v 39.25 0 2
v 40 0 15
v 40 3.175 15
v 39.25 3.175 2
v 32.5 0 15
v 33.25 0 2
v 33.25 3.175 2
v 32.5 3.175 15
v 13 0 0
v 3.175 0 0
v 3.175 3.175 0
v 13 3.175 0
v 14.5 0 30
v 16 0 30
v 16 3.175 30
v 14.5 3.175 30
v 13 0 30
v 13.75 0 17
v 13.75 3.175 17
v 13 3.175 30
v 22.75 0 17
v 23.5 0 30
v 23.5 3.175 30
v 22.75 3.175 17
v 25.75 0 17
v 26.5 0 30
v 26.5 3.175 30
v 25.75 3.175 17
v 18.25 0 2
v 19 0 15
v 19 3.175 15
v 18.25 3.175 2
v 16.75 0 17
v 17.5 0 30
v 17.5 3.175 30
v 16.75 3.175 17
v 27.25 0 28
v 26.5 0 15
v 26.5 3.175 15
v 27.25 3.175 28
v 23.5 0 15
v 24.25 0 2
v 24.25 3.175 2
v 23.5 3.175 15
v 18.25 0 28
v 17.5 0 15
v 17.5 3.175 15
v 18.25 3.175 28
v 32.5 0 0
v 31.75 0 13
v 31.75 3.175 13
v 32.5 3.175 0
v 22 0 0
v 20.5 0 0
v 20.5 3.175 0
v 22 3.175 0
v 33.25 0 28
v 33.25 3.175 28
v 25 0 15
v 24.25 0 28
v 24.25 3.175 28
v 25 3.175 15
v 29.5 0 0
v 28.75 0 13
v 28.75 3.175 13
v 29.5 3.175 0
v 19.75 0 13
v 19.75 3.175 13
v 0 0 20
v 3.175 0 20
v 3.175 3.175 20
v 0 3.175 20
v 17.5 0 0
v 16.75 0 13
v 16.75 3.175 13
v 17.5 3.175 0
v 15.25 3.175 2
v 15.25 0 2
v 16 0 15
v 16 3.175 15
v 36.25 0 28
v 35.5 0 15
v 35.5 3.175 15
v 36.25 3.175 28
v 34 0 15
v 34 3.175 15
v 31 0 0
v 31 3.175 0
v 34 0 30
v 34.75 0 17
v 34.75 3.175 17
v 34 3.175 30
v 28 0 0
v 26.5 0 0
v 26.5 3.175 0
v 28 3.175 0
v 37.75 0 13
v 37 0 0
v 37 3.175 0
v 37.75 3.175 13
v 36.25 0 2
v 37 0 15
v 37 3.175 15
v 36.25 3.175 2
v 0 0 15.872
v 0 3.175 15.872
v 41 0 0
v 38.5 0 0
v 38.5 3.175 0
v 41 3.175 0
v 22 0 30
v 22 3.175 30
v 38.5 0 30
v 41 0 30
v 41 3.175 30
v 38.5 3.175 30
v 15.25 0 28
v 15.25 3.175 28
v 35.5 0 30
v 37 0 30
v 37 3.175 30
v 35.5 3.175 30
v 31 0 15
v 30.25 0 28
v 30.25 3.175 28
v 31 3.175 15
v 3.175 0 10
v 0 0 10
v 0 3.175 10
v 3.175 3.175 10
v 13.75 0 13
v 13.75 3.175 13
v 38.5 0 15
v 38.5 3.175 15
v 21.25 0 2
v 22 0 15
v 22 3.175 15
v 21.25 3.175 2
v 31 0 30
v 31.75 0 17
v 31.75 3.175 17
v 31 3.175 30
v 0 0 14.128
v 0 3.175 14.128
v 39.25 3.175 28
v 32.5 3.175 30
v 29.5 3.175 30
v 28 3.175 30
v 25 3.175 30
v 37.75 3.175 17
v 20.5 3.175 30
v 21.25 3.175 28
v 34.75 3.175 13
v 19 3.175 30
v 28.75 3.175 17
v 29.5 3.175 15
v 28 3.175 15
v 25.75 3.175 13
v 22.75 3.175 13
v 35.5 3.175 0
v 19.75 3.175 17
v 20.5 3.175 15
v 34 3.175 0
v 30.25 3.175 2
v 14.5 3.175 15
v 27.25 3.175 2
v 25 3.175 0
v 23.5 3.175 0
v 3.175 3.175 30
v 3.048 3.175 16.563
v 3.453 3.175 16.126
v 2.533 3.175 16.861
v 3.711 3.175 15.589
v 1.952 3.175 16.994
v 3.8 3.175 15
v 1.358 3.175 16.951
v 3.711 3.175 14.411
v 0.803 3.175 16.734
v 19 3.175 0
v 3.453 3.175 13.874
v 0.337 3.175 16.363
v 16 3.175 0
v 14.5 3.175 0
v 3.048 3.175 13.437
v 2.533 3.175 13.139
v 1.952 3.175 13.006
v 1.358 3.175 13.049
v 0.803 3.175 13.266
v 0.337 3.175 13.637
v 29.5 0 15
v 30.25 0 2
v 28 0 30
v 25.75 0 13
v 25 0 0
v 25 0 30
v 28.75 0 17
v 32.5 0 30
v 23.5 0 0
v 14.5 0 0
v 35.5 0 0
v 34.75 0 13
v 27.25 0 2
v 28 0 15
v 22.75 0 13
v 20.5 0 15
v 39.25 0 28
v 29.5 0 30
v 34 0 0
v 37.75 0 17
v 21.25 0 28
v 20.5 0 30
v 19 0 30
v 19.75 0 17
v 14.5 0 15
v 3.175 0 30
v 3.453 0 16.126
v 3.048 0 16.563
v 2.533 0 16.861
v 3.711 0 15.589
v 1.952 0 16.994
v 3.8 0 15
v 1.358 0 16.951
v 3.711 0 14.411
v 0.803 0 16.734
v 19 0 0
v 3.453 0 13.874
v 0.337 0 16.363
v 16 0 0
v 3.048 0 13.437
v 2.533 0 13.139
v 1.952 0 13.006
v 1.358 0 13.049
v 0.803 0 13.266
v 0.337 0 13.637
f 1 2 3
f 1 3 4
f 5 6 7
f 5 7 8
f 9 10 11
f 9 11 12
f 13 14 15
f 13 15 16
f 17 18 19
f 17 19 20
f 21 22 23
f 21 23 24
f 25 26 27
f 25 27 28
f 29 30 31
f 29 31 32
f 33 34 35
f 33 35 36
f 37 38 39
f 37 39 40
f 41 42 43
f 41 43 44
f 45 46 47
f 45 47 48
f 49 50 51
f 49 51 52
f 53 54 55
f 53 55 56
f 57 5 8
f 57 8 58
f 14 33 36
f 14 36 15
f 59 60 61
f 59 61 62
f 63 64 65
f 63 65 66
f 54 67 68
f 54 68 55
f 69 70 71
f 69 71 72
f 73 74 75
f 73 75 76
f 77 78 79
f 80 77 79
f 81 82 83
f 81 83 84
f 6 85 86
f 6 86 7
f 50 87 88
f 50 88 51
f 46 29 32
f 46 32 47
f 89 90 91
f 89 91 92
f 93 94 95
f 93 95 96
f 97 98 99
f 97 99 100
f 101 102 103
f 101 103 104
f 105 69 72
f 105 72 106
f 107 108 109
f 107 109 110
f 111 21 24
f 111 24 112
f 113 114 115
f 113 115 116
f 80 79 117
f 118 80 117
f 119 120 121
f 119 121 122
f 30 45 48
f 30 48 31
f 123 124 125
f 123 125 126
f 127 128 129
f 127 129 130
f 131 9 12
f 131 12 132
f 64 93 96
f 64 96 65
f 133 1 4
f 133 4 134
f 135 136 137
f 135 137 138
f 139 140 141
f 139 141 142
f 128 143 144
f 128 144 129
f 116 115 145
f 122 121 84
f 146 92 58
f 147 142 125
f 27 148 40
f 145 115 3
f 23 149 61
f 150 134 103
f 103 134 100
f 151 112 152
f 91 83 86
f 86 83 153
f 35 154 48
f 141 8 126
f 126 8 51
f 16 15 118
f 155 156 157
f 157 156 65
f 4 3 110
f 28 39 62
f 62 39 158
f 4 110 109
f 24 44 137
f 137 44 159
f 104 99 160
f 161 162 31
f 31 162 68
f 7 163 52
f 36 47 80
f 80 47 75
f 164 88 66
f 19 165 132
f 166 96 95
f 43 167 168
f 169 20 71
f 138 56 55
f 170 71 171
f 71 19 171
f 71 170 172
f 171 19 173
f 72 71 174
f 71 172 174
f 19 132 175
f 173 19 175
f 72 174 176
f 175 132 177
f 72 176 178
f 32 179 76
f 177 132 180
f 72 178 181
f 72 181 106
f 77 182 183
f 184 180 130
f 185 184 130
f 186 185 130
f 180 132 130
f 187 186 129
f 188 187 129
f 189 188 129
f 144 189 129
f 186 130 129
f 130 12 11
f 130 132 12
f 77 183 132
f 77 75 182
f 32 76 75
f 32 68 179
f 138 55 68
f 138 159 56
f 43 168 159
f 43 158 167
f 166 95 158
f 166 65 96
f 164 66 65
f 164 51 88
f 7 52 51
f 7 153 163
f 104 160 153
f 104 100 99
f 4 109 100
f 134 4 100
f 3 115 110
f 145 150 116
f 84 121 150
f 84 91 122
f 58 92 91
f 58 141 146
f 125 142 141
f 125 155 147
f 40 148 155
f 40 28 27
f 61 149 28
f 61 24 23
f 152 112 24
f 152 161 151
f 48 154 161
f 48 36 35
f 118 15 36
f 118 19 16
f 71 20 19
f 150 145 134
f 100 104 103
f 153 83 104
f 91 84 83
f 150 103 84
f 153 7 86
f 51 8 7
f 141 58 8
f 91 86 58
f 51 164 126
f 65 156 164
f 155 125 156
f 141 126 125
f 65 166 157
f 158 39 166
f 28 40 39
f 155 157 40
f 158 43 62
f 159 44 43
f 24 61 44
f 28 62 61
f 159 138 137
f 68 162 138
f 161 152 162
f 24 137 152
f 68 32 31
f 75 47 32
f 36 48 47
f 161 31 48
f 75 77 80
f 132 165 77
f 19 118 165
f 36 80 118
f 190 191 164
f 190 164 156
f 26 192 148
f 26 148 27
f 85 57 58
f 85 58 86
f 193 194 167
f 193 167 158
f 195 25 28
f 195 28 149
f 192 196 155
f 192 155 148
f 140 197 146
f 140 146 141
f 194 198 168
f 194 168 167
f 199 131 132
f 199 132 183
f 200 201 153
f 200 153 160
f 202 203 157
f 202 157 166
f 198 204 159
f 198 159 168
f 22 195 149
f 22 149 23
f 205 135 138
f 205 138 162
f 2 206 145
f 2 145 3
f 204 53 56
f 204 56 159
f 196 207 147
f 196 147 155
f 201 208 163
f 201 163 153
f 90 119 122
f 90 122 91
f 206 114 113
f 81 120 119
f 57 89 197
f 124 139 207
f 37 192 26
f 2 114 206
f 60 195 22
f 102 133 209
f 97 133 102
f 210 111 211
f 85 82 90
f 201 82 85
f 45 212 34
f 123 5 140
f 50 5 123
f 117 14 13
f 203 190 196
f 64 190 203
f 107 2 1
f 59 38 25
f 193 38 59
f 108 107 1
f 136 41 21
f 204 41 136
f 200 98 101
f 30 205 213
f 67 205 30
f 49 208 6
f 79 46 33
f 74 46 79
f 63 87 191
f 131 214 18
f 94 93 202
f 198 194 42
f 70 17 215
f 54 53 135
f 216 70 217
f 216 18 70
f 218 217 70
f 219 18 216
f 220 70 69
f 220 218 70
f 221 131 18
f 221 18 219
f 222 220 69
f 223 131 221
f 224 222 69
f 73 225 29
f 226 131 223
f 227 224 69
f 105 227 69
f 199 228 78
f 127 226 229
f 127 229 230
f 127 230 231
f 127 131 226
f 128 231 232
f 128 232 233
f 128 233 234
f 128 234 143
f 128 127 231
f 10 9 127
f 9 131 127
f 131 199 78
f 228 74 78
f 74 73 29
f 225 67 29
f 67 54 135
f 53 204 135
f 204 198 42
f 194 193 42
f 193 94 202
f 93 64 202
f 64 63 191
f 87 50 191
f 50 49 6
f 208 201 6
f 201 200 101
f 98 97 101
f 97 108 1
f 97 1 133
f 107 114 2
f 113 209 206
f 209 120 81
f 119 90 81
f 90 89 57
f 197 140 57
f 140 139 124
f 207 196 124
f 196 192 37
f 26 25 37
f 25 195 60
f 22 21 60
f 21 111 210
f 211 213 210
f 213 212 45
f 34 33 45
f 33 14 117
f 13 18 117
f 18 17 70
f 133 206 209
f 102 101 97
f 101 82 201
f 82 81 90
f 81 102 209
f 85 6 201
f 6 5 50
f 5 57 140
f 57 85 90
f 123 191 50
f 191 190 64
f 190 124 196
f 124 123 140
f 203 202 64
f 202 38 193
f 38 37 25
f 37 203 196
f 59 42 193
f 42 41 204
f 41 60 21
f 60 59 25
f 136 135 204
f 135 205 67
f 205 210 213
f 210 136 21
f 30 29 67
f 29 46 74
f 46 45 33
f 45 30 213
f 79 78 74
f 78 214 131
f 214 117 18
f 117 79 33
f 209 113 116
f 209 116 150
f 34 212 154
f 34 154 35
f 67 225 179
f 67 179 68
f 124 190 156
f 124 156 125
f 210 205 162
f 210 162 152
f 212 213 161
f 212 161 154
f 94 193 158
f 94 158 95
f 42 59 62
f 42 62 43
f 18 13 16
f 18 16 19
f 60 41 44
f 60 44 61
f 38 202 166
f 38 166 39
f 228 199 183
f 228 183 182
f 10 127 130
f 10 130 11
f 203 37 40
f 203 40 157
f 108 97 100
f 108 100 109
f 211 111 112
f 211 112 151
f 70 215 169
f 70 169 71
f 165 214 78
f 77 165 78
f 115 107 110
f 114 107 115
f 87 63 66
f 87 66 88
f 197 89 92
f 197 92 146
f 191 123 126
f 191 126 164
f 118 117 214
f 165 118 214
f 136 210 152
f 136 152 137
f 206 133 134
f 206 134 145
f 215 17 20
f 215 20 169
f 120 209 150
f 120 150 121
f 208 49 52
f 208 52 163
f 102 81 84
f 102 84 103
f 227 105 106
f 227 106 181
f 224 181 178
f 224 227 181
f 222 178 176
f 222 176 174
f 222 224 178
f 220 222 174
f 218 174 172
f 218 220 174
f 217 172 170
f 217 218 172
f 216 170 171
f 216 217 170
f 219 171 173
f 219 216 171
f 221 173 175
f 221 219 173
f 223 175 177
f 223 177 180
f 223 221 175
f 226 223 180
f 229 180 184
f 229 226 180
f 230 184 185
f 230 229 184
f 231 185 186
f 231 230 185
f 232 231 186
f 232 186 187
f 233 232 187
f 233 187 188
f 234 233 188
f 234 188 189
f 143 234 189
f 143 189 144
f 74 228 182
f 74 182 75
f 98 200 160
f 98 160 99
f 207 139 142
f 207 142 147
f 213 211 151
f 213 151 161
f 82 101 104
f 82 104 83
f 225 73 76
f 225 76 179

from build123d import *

# Parameters (mm, degrees)
BOSS_EXTRUDE1_DEPTH = 3.175


with BuildPart() as part:
    # Sketch1 → Boss-Extrude1 (new body)
    with BuildSketch(Plane(origin=(0, 0, 0), x_dir=(1, 0, 0), z_dir=(0, 1, 0))):
        with BuildLine():
            Line((13, 0), (3.175, 0))
            Line((3.175, 0), (3.175, -10))
            Line((3.175, -10), (0, -10))
            Line((0, -10), (0, -14.128220211))
            ThreePointArc((0, -14.128220211), (3.8, -15), (0, -15.871779789))
            Line((0, -15.871779789), (0, -20))
            Line((0, -20), (3.175, -20))
            Line((3.175, -20), (3.175, -30))
            Line((3.175, -30), (13, -30))
            Line((13, -30), (13.75, -17))
            Line((13.75, -17), (14.5, -30))
            Line((14.5, -30), (16, -30))
            Line((16, -30), (16.75, -17))
            Line((16.75, -17), (17.5, -30))
            Line((17.5, -30), (19, -30))
            Line((19, -30), (19.75, -17))
            Line((19.75, -17), (20.5, -30))
            Line((20.5, -30), (22, -30))
            Line((22, -30), (22.75, -17))
            Line((22.75, -17), (23.5, -30))
            Line((23.5, -30), (25, -30))
            Line((25, -30), (25.75, -17))
            Line((25.75, -17), (26.5, -30))
            Line((26.5, -30), (28, -30))
            Line((28, -30), (28.75, -17))
            Line((28.75, -17), (29.5, -30))
            Line((29.5, -30), (31, -30))
            Line((31, -30), (31.75, -17))
            Line((31.75, -17), (32.5, -30))
            Line((32.5, -30), (34, -30))
            Line((34, -30), (34.75, -17))
            Line((34.75, -17), (35.5, -30))
            Line((35.5, -30), (37, -30))
            Line((37, -30), (37.75, -17))
            Line((37.75, -17), (38.5, -30))
            Line((38.5, -30), (40, -30))
            Line((40, -30), (41, -30))
            Line((41, -30), (41, 0))
            Line((41, 0), (40, 0))
            Line((40, 0), (38.5, 0))
            Line((38.5, 0), (37.75, -13))
            Line((37.75, -13), (37, 0))
            Line((37, 0), (35.5, 0))
            Line((35.5, 0), (34.75, -13))
            Line((34.75, -13), (34, 0))
            Line((34, 0), (32.5, 0))
            Line((32.5, 0), (31.75, -13))
            Line((31.75, -13), (31, 0))
            Line((31, 0), (29.5, 0))
            Line((29.5, 0), (28.75, -13))
            Line((28.75, -13), (28, 0))
            Line((28, 0), (26.5, 0))
            Line((26.5, 0), (25.75, -13))
            Line((25.75, -13), (25, 0))
            Line((25, 0), (23.5, 0))
            Line((23.5, 0), (22.75, -13))
            Line((22.75, -13), (22, 0))
            Line((22, 0), (20.5, 0))
            Line((20.5, 0), (19.75, -13))
            Line((19.75, -13), (19, 0))
            Line((19, 0), (17.5, 0))
            Line((17.5, 0), (16.75, -13))
            Line((16.75, -13), (16, 0))
            Line((16, 0), (14.5, 0))
            Line((14.5, 0), (13.75, -13))
            Line((13.75, -13), (13, 0))
        make_face()
        Polygon((14.5, -15), (15.25, -2), (16, -15), (15.25, -28), align=None, mode=Mode.SUBTRACT)
        Polygon((17.5, -15), (18.25, -2), (19, -15), (18.25, -28), align=None, mode=Mode.SUBTRACT)
        Polygon((20.5, -15), (21.25, -2), (22, -15), (21.25, -28), align=None, mode=Mode.SUBTRACT)
        Polygon((23.5, -15), (24.25, -2), (25, -15), (24.25, -28), align=None, mode=Mode.SUBTRACT)
        Polygon((26.5, -15), (27.25, -2), (28, -15), (27.25, -28), align=None, mode=Mode.SUBTRACT)
        Polygon((29.5, -15), (30.25, -2), (31, -15), (30.25, -28), align=None, mode=Mode.SUBTRACT)
        Polygon((32.5, -15), (33.25, -2), (34, -15), (33.25, -28), align=None, mode=Mode.SUBTRACT)
        Polygon((35.5, -15), (36.25, -2), (37, -15), (36.25, -28), align=None, mode=Mode.SUBTRACT)
        Polygon((38.5, -15), (39.25, -2), (40, -15), (39.25, -28), align=None, mode=Mode.SUBTRACT)
    extrude(amount=BOSS_EXTRUDE1_DEPTH)


solid = part.part
